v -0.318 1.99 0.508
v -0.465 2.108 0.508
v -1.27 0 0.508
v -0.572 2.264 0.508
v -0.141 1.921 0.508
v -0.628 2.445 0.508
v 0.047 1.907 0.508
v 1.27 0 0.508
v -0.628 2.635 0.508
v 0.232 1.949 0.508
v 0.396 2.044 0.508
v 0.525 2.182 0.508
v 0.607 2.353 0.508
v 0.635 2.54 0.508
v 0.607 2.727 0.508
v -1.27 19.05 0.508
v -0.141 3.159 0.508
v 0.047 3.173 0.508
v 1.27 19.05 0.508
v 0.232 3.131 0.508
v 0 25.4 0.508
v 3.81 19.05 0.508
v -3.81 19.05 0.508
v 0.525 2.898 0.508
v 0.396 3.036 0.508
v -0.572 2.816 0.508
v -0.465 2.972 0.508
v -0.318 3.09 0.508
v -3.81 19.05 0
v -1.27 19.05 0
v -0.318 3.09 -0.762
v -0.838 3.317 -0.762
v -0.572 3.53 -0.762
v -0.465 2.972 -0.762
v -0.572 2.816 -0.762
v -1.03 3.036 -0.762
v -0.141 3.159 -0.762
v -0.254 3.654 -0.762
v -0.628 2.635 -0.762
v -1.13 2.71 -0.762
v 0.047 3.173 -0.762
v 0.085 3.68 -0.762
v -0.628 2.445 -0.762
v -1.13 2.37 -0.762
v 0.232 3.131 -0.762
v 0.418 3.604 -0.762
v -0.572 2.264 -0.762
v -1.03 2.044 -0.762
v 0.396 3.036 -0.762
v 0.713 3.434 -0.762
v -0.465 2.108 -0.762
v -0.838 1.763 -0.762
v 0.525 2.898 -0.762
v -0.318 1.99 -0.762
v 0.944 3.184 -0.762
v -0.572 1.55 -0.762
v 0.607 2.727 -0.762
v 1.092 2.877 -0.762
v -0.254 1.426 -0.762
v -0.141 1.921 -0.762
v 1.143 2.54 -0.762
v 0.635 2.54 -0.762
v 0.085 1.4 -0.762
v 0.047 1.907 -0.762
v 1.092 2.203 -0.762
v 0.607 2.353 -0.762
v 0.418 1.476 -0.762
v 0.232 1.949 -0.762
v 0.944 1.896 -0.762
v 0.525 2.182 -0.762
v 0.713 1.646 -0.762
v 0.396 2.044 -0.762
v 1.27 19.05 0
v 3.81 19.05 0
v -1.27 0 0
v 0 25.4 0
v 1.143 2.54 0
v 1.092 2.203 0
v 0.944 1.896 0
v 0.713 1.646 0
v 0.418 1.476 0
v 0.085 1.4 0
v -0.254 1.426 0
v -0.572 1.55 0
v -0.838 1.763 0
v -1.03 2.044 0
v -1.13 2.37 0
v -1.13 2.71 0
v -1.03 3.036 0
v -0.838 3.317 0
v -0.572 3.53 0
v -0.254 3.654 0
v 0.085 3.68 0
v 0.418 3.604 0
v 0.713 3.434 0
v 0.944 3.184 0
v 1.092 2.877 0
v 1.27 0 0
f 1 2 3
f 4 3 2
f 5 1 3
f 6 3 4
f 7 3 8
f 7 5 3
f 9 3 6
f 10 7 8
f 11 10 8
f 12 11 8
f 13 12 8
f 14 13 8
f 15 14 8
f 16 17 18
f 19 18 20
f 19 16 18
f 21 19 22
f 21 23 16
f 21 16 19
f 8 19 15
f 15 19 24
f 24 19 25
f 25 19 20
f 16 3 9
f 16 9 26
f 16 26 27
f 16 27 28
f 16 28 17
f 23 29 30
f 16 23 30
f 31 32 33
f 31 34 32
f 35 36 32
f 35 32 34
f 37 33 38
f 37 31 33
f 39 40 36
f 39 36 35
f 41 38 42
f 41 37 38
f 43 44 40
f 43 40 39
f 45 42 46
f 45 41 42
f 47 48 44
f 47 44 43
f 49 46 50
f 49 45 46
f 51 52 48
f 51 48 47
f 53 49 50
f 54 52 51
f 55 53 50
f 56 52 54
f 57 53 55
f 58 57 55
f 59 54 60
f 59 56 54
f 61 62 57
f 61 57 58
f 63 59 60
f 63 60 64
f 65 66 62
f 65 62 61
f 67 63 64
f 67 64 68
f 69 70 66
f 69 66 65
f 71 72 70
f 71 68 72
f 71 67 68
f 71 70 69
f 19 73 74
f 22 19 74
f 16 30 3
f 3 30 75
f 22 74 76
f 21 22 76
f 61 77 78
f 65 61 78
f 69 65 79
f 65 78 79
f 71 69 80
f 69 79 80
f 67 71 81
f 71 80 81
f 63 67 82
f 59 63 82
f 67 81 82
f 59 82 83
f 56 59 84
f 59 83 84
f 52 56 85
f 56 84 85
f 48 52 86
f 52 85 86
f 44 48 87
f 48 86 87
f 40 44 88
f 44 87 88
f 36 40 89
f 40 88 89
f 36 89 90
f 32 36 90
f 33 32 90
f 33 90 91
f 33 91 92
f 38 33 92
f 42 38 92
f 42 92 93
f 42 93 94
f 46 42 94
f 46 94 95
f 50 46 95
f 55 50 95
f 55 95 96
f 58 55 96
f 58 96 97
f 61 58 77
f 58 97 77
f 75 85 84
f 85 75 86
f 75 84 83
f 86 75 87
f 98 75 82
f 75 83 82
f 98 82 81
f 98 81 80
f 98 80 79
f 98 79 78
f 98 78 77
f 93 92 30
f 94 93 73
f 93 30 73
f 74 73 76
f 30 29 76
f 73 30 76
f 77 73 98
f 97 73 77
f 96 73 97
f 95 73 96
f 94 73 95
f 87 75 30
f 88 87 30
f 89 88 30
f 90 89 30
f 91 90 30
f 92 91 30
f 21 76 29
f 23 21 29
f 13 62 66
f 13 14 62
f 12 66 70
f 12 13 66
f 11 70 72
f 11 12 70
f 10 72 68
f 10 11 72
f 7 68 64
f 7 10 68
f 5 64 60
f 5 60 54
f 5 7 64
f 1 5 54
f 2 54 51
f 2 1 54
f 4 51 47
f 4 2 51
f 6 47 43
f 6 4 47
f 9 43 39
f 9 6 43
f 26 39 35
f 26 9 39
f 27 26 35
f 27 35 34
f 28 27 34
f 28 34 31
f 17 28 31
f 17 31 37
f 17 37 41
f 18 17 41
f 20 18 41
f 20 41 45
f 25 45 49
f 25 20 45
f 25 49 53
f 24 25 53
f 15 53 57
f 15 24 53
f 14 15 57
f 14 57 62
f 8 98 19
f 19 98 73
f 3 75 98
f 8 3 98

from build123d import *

# Parameters (mm, degrees)
BOSS_EXTRUDE1_DEPTH = 0.508
SKETCH3_R           = 0.635
CUT_EXTRUDE1_DEPTH  = 26.689183794
SKETCH5_R           = 1.143
SKETCH5_R_2         = 0.635
BOSS_EXTRUDE2_DEPTH = 0.762


with BuildPart() as part:
    # Sketch1 → Boss-Extrude1 (new body)
    with BuildSketch(Plane.XY):
        Polygon((1.27, 0), (1.27, 19.05), (3.81, 19.05), (0, 25.4), (-3.81, 19.05), (-1.27, 19.05), (-1.27, 0), align=None)
    extrude(amount=BOSS_EXTRUDE1_DEPTH)

    # Sketch3 → Cut-Extrude1 (cut, through all)
    with BuildSketch(Plane.XY.offset(0.508)):
        with Locations((0, 2.54)):
            Circle(SKETCH3_R)
    extrude(amount=-CUT_EXTRUDE1_DEPTH, mode=Mode.SUBTRACT)

    # Sketch5 → Boss-Extrude2 (add)
    with BuildSketch(Plane(origin=(0, 0, 0), x_dir=(-1, 0, 0), z_dir=(0, 0, -1))):
        with Locations(Location((0, 2.54, 0), (0, 0, 180))):
            Circle(SKETCH5_R)
        with Locations(Location((0, 2.54, 0), (0, 0, 180))):
            Circle(SKETCH5_R_2, mode=Mode.SUBTRACT)
    extrude(amount=BOSS_EXTRUDE2_DEPTH)


solid = part.part
